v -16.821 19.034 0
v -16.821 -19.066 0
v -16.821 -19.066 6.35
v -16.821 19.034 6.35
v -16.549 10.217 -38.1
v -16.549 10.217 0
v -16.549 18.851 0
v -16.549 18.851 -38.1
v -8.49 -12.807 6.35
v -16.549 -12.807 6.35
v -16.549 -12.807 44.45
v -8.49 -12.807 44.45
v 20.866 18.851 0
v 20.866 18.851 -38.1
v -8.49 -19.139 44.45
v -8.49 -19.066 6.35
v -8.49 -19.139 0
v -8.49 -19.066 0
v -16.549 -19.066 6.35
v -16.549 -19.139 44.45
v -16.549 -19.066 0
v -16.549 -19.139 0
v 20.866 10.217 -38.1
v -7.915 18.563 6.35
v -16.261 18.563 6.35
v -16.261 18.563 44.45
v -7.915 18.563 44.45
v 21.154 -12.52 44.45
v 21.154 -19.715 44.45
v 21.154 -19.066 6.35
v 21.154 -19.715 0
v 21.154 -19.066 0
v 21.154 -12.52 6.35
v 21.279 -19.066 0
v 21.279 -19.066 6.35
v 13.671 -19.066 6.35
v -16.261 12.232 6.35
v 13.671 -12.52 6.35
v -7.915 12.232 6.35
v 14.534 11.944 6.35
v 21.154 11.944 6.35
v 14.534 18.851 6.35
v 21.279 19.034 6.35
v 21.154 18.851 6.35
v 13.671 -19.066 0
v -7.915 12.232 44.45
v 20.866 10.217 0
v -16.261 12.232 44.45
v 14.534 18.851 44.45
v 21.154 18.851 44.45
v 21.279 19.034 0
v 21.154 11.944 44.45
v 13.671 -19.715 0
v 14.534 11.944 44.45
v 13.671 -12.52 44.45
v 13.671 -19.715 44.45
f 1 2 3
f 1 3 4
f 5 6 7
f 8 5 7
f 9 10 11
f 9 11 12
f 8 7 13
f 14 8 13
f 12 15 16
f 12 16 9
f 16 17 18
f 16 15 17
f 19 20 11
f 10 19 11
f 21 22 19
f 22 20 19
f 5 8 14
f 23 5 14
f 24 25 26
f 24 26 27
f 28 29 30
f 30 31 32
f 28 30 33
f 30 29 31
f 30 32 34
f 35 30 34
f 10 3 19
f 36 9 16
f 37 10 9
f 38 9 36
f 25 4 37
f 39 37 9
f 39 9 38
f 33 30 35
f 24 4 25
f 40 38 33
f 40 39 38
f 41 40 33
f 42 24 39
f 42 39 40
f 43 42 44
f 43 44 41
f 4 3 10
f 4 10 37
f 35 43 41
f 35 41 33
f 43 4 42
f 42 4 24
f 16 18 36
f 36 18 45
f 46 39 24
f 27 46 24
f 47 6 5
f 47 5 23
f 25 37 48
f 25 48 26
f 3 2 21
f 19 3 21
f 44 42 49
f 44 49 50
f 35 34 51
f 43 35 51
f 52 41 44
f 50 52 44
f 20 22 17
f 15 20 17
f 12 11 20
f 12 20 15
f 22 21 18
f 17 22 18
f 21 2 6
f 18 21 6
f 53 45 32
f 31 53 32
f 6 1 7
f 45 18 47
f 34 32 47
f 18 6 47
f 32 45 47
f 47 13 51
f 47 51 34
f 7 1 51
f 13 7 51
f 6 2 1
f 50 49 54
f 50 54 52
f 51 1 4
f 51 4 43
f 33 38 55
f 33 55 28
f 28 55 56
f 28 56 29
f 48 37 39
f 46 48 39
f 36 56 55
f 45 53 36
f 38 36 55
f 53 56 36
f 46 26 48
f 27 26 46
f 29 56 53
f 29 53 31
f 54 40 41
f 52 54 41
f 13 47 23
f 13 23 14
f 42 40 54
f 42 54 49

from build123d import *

# Parameters (mm, degrees)
F0_W     = 38.1
F0_H     = 38.1
F1_DEPTH = 6.35
F2_W     = 37.414748
F2_H     = 8.634172
F3_DEPTH = 38.1
F4_W     = 8.058558
F4_H     = 6.331727
F4_W_2   = 7.482949
F4_H_2   = 7.195144
F4_W_3   = 8.346364
F4_W_4   = 6.619532
F4_H_3   = 6.907337
F5_DEPTH = 44.45


with BuildPart() as f1:
    # F0 (on Top) → F1 (new body)
    with BuildSketch(Plane.XY):
        with Locations((2.229119, -0.015891)):
            Rectangle(F0_W, F0_H)
    extrude(amount=F1_DEPTH)

    # F2 (on Top) → F3 (join)
    with BuildSketch(Plane.XY):
        with Locations((2.158543, 14.53419)):
            Rectangle(F2_W, F2_H)
    extrude(amount=-F3_DEPTH)

    # F4 (on Top) → F5 (join)
    with BuildSketch(Plane.XY):
        with Locations((-12.51955, -15.973219)):
            Rectangle(F4_W, F4_H)
        with Locations((17.412247, -16.117122)):
            Rectangle(F4_W_2, F4_H_2)
        with Locations((-12.087842, 15.397609)):
            Rectangle(F4_W_3, F4_H)
        with Locations((17.843956, 15.397607)):
            Rectangle(F4_W_4, F4_H_3)
    extrude(amount=F5_DEPTH)


solid = f1.part
